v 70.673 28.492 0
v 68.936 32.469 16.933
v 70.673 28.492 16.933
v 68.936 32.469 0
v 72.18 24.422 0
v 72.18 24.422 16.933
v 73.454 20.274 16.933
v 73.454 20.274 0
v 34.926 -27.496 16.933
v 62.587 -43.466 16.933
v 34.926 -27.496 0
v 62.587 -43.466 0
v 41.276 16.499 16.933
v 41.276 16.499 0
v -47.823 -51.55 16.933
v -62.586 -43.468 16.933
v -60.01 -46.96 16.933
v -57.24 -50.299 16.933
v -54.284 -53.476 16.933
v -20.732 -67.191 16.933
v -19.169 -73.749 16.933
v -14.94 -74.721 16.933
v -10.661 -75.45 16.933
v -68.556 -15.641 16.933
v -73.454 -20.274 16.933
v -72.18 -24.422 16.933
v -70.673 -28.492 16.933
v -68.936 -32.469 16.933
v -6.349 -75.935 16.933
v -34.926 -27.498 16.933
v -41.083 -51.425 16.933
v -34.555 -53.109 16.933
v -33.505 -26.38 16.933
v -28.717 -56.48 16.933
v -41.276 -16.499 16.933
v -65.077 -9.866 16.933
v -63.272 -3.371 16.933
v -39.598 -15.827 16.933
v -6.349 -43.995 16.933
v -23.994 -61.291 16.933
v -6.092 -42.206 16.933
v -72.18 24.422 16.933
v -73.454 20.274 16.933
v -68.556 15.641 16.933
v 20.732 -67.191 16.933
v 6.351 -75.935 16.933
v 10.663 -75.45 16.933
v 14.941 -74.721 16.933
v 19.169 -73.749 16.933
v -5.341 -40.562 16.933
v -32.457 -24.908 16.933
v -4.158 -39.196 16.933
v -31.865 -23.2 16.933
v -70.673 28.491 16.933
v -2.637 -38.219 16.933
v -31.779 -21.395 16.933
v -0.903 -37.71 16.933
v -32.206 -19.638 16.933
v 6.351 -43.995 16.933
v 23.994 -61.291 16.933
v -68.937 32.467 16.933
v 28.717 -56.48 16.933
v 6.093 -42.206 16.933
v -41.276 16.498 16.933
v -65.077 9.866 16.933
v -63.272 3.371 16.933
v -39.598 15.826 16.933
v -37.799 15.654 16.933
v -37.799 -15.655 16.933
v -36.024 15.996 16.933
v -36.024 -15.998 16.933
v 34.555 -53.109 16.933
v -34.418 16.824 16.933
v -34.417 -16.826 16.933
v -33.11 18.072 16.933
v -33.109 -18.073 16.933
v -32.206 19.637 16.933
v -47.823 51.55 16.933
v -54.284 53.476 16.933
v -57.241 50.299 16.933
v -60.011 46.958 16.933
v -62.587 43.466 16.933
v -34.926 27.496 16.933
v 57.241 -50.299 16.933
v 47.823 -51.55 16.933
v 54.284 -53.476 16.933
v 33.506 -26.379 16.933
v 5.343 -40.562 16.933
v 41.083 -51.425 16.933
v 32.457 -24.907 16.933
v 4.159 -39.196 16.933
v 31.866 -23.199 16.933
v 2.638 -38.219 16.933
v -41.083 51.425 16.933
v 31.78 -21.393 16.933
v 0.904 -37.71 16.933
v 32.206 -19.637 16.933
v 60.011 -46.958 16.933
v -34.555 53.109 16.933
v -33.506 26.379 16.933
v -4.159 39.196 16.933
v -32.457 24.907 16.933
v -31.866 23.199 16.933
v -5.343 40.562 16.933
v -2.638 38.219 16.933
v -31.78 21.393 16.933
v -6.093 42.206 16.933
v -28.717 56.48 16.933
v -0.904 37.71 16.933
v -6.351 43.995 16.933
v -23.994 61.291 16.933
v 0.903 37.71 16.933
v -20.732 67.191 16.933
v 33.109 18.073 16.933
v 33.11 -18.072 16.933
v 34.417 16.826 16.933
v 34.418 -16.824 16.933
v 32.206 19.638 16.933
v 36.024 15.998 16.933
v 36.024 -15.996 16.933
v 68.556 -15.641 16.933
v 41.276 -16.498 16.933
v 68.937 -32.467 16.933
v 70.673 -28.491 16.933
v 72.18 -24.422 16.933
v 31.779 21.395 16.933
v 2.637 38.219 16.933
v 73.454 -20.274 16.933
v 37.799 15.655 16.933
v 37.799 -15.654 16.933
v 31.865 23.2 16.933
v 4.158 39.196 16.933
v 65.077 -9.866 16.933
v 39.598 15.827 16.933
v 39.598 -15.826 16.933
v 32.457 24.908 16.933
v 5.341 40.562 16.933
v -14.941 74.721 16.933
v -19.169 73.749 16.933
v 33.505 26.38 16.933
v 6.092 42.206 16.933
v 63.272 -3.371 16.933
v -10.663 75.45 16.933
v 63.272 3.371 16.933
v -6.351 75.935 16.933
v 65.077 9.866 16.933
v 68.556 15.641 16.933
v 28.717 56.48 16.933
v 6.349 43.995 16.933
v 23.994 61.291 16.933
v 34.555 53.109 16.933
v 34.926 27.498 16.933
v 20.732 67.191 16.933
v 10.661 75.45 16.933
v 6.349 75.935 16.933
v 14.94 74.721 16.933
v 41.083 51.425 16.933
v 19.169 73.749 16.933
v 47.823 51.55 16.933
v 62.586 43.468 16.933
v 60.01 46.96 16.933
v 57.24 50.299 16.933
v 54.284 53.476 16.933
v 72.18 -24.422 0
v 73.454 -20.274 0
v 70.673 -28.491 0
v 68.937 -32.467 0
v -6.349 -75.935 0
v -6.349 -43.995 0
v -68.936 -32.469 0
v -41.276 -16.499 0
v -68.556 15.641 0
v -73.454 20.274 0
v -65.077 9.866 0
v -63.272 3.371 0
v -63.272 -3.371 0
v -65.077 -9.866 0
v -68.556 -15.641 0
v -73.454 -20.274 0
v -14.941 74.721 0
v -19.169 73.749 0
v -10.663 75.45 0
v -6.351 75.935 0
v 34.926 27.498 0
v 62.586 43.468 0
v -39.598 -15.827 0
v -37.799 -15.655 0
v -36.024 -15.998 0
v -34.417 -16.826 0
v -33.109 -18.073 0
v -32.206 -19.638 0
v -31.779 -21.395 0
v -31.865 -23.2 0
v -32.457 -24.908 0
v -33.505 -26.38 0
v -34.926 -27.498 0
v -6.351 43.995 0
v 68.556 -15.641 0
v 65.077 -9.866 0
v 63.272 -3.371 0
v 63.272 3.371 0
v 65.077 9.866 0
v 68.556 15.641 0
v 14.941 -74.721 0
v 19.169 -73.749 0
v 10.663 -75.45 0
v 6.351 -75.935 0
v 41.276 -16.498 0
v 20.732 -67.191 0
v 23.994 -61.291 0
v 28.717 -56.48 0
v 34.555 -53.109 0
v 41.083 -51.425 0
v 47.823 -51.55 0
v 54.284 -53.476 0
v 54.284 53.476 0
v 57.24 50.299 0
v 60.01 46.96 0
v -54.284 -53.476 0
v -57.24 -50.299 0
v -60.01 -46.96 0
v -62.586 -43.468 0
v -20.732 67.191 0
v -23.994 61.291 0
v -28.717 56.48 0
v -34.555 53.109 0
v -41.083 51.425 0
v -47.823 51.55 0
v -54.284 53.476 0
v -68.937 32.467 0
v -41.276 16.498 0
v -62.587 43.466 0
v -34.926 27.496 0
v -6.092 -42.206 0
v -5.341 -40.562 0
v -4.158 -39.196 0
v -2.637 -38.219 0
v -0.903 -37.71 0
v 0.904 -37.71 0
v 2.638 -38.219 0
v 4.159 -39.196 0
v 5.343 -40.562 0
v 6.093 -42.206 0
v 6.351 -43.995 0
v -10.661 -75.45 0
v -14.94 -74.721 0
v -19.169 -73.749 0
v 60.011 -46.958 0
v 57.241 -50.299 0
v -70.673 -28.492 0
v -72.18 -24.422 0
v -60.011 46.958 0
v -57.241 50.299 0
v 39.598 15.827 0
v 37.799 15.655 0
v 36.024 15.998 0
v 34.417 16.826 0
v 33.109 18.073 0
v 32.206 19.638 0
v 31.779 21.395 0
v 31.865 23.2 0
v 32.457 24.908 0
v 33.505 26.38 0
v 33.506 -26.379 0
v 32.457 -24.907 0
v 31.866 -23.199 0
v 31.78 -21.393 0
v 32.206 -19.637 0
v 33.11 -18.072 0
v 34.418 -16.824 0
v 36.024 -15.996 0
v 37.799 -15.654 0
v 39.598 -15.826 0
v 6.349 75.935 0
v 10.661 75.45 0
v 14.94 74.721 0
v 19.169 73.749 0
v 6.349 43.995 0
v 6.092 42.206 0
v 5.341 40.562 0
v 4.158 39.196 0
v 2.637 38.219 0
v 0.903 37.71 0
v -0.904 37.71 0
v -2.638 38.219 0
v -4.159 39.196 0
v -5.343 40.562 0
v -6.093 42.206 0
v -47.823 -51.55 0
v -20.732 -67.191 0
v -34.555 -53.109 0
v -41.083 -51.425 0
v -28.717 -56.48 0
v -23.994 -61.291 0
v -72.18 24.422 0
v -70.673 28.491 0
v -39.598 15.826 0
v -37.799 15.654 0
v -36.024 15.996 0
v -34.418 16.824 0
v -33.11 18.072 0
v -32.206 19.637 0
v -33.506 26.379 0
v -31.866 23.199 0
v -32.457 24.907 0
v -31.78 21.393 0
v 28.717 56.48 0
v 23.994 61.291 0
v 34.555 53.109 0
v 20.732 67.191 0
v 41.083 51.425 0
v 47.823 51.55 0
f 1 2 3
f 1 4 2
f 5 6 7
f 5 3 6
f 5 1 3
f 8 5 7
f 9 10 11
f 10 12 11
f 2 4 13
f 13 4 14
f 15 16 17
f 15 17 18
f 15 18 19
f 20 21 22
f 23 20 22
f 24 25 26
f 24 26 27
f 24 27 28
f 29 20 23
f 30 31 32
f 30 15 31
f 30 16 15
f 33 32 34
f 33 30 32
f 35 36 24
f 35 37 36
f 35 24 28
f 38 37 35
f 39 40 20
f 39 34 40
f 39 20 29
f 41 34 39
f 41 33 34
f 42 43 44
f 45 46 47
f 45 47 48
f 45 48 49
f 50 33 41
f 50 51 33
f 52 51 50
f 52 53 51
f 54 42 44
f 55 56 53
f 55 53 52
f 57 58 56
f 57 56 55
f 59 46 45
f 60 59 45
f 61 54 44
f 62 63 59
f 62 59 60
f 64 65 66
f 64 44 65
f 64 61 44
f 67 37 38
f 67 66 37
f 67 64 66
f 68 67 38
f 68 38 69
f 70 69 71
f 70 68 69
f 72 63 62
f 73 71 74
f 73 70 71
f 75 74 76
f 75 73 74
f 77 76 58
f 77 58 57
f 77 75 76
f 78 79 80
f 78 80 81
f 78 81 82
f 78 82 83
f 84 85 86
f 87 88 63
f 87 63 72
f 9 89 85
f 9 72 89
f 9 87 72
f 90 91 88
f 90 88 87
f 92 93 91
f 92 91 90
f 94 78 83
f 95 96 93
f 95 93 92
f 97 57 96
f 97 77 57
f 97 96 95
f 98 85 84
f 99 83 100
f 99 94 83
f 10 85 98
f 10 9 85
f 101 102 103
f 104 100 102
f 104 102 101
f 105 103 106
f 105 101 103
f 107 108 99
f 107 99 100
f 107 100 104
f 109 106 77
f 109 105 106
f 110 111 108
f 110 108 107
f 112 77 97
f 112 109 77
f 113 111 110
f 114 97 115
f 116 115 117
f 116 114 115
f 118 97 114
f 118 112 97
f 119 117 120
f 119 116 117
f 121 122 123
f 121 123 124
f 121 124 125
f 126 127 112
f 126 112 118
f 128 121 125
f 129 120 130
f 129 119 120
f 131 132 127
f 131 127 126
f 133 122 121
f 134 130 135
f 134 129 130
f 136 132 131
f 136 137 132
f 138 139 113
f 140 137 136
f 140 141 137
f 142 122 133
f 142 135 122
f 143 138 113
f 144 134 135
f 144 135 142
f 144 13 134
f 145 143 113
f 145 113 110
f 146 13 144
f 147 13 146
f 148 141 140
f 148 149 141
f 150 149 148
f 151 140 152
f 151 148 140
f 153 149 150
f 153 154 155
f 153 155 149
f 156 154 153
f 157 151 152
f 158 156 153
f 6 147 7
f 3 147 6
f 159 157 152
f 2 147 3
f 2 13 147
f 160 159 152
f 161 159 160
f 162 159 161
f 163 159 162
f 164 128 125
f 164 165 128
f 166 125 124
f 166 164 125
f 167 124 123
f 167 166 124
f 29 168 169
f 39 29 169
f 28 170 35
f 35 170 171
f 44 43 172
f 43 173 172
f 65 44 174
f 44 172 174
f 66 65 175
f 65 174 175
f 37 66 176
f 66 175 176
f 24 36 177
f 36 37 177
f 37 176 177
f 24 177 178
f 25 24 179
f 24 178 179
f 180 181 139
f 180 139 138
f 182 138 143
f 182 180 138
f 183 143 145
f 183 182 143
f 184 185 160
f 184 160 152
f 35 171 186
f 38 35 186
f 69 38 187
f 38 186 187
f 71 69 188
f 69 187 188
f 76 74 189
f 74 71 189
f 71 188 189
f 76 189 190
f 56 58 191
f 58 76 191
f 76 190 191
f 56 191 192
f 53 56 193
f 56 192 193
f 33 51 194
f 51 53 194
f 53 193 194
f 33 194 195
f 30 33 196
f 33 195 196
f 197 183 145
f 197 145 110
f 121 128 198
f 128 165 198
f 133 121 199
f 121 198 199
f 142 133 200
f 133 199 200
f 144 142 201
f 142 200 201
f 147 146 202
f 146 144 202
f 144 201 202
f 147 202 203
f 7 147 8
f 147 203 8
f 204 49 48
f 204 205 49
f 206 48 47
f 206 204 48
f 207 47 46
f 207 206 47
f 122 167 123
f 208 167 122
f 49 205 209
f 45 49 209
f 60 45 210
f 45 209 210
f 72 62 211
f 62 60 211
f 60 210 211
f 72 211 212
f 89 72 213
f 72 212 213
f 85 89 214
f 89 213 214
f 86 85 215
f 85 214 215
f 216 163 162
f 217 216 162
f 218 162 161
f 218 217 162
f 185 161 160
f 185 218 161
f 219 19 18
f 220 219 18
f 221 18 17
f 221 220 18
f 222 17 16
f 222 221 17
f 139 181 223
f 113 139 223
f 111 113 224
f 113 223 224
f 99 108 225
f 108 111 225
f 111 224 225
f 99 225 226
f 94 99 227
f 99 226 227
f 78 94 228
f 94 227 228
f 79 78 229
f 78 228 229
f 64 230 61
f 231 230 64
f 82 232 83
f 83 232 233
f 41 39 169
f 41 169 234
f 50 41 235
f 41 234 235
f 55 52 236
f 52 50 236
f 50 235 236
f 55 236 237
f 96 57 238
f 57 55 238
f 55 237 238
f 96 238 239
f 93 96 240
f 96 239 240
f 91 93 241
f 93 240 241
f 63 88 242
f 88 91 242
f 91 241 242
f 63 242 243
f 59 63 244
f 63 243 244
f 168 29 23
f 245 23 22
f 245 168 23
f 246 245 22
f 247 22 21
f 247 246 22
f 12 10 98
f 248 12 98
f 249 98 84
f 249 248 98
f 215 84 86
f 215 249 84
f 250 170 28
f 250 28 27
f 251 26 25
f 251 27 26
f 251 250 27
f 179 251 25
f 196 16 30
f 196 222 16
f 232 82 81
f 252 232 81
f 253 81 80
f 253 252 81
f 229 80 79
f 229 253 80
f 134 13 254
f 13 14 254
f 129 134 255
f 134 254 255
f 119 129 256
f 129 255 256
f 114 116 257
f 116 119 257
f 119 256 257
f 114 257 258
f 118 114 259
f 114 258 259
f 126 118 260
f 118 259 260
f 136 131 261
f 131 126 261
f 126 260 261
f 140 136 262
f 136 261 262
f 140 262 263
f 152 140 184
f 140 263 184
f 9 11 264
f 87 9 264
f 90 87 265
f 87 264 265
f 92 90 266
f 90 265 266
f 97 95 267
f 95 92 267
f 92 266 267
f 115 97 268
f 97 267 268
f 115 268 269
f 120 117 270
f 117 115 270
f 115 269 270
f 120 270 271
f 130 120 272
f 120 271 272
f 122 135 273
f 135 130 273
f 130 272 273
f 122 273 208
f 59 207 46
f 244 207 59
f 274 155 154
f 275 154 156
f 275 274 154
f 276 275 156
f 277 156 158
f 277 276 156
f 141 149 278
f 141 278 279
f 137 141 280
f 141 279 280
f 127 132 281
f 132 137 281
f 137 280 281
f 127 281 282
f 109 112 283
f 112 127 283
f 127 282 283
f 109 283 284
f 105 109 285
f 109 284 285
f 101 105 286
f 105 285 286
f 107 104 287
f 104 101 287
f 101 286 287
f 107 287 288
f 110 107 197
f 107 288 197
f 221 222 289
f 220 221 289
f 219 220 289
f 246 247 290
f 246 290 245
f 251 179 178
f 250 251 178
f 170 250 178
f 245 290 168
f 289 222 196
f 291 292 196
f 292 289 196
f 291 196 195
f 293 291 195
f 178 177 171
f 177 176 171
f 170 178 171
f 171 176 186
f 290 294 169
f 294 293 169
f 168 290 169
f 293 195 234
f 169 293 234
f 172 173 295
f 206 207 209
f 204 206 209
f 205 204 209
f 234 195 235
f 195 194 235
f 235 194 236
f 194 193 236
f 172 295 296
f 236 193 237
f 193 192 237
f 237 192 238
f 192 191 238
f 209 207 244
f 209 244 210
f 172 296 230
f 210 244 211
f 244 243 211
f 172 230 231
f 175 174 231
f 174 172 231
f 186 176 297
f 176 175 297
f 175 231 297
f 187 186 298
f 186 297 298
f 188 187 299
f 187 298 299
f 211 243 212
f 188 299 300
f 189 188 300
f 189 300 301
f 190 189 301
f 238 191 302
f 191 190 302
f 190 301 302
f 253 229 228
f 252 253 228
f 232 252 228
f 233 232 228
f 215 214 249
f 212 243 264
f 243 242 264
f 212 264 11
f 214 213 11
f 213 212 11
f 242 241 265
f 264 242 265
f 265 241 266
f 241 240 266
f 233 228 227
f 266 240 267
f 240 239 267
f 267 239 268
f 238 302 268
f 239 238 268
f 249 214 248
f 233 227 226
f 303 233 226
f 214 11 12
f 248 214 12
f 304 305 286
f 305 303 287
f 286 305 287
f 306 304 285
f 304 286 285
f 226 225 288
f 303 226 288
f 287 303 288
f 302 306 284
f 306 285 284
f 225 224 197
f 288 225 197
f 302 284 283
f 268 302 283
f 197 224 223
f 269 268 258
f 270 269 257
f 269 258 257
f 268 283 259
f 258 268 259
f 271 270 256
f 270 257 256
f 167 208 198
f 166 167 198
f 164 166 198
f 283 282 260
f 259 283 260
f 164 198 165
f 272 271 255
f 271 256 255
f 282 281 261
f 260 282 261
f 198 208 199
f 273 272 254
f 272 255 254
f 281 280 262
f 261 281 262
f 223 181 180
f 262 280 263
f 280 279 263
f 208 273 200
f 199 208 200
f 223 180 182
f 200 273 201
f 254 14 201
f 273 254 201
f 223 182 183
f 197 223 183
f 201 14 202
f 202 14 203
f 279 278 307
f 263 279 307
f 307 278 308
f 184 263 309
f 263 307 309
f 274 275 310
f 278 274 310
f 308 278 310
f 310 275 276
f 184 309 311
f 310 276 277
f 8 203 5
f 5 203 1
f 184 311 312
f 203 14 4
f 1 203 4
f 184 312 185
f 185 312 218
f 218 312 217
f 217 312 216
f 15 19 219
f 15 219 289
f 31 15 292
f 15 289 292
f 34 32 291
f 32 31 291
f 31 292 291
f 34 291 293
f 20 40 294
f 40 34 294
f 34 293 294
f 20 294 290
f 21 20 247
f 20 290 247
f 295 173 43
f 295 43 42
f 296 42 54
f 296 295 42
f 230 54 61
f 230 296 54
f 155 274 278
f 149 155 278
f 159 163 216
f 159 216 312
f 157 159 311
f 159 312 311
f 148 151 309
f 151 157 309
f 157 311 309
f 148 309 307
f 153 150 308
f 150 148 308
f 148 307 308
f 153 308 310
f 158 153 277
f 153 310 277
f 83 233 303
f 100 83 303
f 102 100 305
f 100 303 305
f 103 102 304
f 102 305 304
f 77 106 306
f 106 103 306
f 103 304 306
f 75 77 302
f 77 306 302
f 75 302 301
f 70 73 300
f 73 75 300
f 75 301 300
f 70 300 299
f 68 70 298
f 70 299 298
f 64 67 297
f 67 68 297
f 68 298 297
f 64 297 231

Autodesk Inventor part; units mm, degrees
ref_plane "YZ Plane" through (0, 0, 0) normal (1, 0, 0) x (0, 1, 0)
ref_plane "XZ Plane" through (0, 0, 0) normal (0, 1, 0) x (-1, 0, 0)
ref_plane "XY Plane" through (0, 0, 0) normal (0, 0, 1) x (1, 0, 0)
sketch "Sketch2" plane through (0, 0, 0) normal (0, 0, 1) x (1, 0, 0)
  line L0 (0, 0) -> (87.9881, 0) construction
  line L1 (0, 0) -> (65.9905, 38.1011) construction
  line L2 (65.9905, 38.1011) -> (87.9881, 0) construction
  circle A0 centre (0, 0) radius 76.2 construction
  line L3 (62.5859, 43.4678) -> (34.9256, 27.4975)
  line L4 (68.9361, 32.4694) -> (41.2758, 16.4991)
  arc A1 (34.9256, 27.4975) -> (41.2758, 16.4991) centre (38.1007, 21.9983) ccw
  arc A2 (73.4536, 20.2735) -> (73.4536, -20.2735) centre (87.9881, 0) ccw
  arc A3 (73.4536, 20.2735) -> (68.9361, 32.4694) centre (0, 0) ccw
  line L5 (62.5873, -43.4657) -> (34.9265, -27.4963)
  arc A4 (41.2764, -16.4977) -> (34.9265, -27.4963) centre (38.1014, -21.997) ccw
  line L6 (68.9371, -32.4671) -> (41.2764, -16.4977)
  arc A5 (54.2842, -53.4759) -> (62.5873, -43.4657) centre (0, 0) ccw
  arc A6 (54.2842, -53.4759) -> (19.1694, -73.7494) centre (43.9941, -76.2) ccw
  line L7 (-6.3487, -75.9351) -> (-6.3493, -43.9954)
  arc A7 (6.3507, -43.9952) -> (-6.3493, -43.9954) centre (0.0007, -43.9953) ccw
  line L8 (6.3513, -75.9348) -> (6.3507, -43.9952)
  arc A8 (-19.1694, -73.7494) -> (-6.3487, -75.9351) centre (0, 0) ccw
  arc A9 (-19.1694, -73.7494) -> (-54.2842, -53.4759) centre (-43.9941, -76.2) ccw
  line L9 (-68.9361, -32.4694) -> (-41.2758, -16.4991)
  arc A10 (-34.9256, -27.4975) -> (-41.2758, -16.4991) centre (-38.1007, -21.9983) ccw
  line L10 (-62.5859, -43.4678) -> (-34.9256, -27.4975)
  arc A11 (-73.4536, -20.2735) -> (-68.9361, -32.4694) centre (0, 0) ccw
  arc A12 (-73.4536, -20.2735) -> (-73.4536, 20.2735) centre (-87.9881, 0) ccw
  line L11 (-62.5873, 43.4657) -> (-34.9265, 27.4963)
  arc A13 (-41.2764, 16.4977) -> (-34.9265, 27.4963) centre (-38.1014, 21.997) ccw
  line L12 (-68.9371, 32.4671) -> (-41.2764, 16.4977)
  arc A14 (-54.2842, 53.4759) -> (-62.5873, 43.4657) centre (0, 0) ccw
  arc A15 (-54.2842, 53.4759) -> (-19.1694, 73.7494) centre (-43.9941, 76.2) ccw
  line L13 (6.3487, 75.9351) -> (6.3493, 43.9954)
  arc A16 (-6.3507, 43.9952) -> (6.3493, 43.9954) centre (-0.0007, 43.9953) ccw
  line L14 (-6.3513, 75.9348) -> (-6.3507, 43.9952)
  arc A17 (19.1694, 73.7494) -> (6.3487, 75.9351) centre (0, 0) ccw
  arc A18 (19.1694, 73.7494) -> (54.2842, 53.4759) centre (43.9941, 76.2) ccw
  arc A19 (62.5859, 43.4678) -> (54.2842, 53.4759) centre (0, 0) ccw
  arc A20 (-6.3513, 75.9348) -> (-19.1694, 73.7494) centre (0, 0) ccw
  arc A21 (-68.9371, 32.4671) -> (-73.4536, 20.2735) centre (0, 0) ccw
  arc A22 (-62.5859, -43.4678) -> (-54.2842, -53.4759) centre (0, 0) ccw
  arc A23 (6.3513, -75.9348) -> (19.1694, -73.7494) centre (0, 0) ccw
  arc A24 (68.9371, -32.4671) -> (73.4536, -20.2735) centre (0, 0) ccw
  dimension "d6" = 87.9881
  dimension "d7" = 43.9953
  dimension "d8" = 76.2
  dimension "d9" = 12.7
  dimension "d10" = 32.2047
  dimension "d12" = 24.9453
  dimension "d15" = 360
extrude "Extrusion1" add sketch "Sketch2" along normal blind 16.9333
properties part number "Geneva Driven"
